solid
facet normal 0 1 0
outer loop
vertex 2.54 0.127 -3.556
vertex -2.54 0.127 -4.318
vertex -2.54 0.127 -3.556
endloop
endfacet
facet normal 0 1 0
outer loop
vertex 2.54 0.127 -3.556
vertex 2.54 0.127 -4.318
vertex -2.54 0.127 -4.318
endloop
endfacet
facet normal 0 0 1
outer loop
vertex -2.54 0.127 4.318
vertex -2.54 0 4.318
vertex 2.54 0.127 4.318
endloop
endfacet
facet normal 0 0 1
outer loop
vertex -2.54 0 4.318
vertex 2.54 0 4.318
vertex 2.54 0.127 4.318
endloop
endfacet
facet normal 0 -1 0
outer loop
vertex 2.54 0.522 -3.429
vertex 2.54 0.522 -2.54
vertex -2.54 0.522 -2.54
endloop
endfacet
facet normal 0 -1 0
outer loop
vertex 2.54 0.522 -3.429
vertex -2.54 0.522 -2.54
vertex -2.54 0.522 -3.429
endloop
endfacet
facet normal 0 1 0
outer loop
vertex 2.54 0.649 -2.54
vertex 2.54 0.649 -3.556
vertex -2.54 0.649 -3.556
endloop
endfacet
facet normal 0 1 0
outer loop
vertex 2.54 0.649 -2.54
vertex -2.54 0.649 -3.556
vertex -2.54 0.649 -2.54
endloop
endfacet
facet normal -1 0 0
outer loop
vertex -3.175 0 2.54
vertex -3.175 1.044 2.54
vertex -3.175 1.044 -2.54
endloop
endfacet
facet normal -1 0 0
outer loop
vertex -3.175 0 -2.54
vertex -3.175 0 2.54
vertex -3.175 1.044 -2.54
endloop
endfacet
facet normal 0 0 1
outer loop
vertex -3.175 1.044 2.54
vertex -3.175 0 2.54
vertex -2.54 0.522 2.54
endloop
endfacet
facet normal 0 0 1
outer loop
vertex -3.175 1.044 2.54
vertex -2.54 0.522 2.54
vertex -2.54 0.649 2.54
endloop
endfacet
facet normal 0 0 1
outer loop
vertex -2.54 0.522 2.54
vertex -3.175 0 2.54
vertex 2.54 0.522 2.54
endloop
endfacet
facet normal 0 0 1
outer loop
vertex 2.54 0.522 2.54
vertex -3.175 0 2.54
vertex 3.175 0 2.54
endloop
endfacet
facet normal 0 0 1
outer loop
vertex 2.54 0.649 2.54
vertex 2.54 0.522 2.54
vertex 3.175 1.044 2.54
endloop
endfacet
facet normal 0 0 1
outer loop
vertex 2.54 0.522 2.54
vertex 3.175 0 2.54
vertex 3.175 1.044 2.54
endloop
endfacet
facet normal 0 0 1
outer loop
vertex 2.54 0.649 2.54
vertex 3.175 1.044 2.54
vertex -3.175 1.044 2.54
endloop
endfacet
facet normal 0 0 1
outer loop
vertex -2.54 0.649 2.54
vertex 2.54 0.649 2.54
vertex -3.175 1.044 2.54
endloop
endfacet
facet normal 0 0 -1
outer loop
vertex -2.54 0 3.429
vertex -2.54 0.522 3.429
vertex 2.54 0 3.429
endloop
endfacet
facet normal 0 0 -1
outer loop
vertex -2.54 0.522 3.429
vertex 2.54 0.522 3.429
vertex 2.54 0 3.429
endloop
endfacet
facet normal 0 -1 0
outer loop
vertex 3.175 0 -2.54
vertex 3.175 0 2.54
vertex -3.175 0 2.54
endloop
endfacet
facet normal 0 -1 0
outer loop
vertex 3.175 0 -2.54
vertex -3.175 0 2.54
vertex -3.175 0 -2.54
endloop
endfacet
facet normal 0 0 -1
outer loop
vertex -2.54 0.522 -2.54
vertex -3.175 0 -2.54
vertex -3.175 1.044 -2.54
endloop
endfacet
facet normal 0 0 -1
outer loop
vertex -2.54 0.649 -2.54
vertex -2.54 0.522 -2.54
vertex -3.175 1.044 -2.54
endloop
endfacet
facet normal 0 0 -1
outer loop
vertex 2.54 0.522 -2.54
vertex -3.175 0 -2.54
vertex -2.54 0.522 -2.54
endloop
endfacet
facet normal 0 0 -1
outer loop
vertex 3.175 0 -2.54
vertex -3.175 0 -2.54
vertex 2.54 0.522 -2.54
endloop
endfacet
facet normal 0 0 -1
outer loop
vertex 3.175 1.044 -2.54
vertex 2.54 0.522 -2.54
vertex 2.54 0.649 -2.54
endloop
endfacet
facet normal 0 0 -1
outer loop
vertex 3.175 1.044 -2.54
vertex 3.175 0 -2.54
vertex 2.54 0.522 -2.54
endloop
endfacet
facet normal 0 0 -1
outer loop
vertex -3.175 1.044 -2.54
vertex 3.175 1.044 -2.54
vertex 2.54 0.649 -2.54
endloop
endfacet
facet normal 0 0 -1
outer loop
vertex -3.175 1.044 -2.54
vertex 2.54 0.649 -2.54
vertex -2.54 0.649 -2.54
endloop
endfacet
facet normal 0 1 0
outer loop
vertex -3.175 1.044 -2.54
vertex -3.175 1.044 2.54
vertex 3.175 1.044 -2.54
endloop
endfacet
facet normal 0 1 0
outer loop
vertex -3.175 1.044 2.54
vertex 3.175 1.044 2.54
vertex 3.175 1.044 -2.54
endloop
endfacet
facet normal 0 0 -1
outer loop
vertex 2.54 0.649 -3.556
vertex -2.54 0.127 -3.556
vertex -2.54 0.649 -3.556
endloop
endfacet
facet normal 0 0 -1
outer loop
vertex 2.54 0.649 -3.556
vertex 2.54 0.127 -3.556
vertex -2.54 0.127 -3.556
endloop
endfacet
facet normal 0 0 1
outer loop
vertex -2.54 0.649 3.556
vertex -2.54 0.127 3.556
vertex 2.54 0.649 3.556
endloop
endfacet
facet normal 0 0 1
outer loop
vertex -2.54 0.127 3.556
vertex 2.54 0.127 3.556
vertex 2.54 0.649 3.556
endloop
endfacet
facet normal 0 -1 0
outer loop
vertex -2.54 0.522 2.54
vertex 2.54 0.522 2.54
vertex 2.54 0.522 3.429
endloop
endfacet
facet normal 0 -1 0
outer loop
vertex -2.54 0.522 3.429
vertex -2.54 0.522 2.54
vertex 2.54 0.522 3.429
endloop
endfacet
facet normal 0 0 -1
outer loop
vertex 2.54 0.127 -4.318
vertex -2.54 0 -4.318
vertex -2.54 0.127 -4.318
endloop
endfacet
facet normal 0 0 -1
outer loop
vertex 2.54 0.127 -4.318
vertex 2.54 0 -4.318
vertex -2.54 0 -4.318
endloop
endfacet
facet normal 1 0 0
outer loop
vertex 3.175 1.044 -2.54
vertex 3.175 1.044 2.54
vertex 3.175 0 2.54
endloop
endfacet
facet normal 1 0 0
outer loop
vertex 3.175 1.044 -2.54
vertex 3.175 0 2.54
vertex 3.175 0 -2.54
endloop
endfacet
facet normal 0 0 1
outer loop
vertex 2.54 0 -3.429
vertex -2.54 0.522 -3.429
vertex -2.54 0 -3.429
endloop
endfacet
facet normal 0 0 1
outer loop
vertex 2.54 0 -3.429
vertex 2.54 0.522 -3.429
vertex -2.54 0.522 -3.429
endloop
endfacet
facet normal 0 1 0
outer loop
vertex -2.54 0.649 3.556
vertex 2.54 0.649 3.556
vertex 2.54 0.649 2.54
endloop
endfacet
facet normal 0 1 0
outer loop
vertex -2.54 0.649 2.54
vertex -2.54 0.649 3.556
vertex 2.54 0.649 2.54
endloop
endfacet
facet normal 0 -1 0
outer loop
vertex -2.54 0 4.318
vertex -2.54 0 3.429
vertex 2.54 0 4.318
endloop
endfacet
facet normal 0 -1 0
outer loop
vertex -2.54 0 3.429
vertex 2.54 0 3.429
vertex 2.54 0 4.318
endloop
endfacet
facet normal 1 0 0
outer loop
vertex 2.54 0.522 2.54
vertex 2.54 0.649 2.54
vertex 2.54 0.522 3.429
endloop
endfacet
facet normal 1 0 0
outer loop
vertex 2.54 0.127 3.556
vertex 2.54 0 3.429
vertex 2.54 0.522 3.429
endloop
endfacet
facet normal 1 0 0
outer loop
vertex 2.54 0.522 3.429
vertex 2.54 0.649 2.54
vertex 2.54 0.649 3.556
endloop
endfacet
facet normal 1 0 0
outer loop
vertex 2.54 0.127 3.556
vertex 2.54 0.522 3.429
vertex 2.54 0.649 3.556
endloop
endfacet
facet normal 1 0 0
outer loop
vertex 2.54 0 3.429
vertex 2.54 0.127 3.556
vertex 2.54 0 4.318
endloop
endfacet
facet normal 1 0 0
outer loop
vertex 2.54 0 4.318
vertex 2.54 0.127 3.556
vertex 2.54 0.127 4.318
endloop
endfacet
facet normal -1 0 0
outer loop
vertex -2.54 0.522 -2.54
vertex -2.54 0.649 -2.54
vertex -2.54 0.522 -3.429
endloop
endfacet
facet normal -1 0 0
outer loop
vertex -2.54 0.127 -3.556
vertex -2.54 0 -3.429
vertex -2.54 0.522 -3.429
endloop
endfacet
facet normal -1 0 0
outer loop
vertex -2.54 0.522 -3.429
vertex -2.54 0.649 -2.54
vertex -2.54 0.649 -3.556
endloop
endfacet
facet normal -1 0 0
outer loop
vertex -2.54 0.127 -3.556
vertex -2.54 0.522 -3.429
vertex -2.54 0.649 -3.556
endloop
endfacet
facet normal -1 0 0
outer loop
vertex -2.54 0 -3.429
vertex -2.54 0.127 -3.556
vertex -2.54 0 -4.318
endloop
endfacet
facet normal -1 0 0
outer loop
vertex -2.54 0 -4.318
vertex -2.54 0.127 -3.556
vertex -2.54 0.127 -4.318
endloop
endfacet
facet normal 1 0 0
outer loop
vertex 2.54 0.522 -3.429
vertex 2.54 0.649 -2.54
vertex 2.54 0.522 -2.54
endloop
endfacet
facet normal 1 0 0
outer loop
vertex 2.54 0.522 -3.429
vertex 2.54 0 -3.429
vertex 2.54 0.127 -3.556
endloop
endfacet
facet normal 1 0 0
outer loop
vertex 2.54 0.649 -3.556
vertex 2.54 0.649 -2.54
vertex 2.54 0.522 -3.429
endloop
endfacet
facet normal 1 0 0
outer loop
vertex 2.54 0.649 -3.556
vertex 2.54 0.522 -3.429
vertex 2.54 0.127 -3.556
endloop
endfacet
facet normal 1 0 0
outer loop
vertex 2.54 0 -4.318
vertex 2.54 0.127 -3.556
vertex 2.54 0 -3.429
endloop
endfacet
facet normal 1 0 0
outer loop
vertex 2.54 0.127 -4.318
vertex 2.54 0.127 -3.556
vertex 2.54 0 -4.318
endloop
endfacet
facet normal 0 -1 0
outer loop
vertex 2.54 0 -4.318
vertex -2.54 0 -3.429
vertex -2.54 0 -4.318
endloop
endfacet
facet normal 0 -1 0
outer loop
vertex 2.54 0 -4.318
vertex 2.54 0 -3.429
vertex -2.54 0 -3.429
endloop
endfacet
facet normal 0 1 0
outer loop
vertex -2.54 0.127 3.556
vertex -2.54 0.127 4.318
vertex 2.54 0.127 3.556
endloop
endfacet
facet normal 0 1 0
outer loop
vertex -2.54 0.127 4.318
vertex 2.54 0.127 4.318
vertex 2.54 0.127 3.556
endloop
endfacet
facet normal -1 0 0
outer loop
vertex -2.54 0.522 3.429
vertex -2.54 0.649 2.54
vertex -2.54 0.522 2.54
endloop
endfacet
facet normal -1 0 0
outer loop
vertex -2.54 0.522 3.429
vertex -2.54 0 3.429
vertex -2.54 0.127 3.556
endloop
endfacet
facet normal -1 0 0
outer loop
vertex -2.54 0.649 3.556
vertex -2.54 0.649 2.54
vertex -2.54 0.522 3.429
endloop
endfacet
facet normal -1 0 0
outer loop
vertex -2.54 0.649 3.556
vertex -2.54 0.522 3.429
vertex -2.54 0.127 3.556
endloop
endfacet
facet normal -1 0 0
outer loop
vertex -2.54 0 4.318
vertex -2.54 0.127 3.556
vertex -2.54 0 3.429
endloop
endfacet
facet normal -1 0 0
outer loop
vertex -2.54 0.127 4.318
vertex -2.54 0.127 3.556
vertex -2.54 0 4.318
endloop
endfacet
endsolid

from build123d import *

# Parameters (mm, degrees)
SKETCH1_W           = 5.08
SKETCH1_H           = 1.044000004
BOSS_EXTRUDE1_DEPTH = 3.175
EXTRUDE_THIN1_DEPTH = 2.54


with BuildPart() as part:
    # Sketch1 → Boss-Extrude1 (new body, symmetric)
    with BuildSketch(Plane(origin=(0, 0, 0), x_dir=(0, 0, -1), z_dir=(1, 0, 0))):
        with Locations((0, 0.522000002)):
            Rectangle(SKETCH1_W, SKETCH1_H)
    extrude(amount=BOSS_EXTRUDE1_DEPTH, both=True)

    # Sketch2 → Extrude-Thin1 (add, symmetric)
    with BuildSketch(Plane(origin=(0, 0, 0), x_dir=(0, 0, -1), z_dir=(1, 0, 0))):
        Polygon((-2.54, 0.522000002), (-3.429, 0.522000002), (-3.429, 0), (-4.318, 0), (-4.318, 0.127), (-3.556, 0.127), (-3.556, 0.649000002), (-2.54, 0.649000002), align=None)
    extrude_thin1 = extrude(amount=EXTRUDE_THIN1_DEPTH, both=True)

    # Mirror1: Extrude-Thin1 across plane
    add(extrude_thin1.mirror(Plane.XY))


solid = part.part
